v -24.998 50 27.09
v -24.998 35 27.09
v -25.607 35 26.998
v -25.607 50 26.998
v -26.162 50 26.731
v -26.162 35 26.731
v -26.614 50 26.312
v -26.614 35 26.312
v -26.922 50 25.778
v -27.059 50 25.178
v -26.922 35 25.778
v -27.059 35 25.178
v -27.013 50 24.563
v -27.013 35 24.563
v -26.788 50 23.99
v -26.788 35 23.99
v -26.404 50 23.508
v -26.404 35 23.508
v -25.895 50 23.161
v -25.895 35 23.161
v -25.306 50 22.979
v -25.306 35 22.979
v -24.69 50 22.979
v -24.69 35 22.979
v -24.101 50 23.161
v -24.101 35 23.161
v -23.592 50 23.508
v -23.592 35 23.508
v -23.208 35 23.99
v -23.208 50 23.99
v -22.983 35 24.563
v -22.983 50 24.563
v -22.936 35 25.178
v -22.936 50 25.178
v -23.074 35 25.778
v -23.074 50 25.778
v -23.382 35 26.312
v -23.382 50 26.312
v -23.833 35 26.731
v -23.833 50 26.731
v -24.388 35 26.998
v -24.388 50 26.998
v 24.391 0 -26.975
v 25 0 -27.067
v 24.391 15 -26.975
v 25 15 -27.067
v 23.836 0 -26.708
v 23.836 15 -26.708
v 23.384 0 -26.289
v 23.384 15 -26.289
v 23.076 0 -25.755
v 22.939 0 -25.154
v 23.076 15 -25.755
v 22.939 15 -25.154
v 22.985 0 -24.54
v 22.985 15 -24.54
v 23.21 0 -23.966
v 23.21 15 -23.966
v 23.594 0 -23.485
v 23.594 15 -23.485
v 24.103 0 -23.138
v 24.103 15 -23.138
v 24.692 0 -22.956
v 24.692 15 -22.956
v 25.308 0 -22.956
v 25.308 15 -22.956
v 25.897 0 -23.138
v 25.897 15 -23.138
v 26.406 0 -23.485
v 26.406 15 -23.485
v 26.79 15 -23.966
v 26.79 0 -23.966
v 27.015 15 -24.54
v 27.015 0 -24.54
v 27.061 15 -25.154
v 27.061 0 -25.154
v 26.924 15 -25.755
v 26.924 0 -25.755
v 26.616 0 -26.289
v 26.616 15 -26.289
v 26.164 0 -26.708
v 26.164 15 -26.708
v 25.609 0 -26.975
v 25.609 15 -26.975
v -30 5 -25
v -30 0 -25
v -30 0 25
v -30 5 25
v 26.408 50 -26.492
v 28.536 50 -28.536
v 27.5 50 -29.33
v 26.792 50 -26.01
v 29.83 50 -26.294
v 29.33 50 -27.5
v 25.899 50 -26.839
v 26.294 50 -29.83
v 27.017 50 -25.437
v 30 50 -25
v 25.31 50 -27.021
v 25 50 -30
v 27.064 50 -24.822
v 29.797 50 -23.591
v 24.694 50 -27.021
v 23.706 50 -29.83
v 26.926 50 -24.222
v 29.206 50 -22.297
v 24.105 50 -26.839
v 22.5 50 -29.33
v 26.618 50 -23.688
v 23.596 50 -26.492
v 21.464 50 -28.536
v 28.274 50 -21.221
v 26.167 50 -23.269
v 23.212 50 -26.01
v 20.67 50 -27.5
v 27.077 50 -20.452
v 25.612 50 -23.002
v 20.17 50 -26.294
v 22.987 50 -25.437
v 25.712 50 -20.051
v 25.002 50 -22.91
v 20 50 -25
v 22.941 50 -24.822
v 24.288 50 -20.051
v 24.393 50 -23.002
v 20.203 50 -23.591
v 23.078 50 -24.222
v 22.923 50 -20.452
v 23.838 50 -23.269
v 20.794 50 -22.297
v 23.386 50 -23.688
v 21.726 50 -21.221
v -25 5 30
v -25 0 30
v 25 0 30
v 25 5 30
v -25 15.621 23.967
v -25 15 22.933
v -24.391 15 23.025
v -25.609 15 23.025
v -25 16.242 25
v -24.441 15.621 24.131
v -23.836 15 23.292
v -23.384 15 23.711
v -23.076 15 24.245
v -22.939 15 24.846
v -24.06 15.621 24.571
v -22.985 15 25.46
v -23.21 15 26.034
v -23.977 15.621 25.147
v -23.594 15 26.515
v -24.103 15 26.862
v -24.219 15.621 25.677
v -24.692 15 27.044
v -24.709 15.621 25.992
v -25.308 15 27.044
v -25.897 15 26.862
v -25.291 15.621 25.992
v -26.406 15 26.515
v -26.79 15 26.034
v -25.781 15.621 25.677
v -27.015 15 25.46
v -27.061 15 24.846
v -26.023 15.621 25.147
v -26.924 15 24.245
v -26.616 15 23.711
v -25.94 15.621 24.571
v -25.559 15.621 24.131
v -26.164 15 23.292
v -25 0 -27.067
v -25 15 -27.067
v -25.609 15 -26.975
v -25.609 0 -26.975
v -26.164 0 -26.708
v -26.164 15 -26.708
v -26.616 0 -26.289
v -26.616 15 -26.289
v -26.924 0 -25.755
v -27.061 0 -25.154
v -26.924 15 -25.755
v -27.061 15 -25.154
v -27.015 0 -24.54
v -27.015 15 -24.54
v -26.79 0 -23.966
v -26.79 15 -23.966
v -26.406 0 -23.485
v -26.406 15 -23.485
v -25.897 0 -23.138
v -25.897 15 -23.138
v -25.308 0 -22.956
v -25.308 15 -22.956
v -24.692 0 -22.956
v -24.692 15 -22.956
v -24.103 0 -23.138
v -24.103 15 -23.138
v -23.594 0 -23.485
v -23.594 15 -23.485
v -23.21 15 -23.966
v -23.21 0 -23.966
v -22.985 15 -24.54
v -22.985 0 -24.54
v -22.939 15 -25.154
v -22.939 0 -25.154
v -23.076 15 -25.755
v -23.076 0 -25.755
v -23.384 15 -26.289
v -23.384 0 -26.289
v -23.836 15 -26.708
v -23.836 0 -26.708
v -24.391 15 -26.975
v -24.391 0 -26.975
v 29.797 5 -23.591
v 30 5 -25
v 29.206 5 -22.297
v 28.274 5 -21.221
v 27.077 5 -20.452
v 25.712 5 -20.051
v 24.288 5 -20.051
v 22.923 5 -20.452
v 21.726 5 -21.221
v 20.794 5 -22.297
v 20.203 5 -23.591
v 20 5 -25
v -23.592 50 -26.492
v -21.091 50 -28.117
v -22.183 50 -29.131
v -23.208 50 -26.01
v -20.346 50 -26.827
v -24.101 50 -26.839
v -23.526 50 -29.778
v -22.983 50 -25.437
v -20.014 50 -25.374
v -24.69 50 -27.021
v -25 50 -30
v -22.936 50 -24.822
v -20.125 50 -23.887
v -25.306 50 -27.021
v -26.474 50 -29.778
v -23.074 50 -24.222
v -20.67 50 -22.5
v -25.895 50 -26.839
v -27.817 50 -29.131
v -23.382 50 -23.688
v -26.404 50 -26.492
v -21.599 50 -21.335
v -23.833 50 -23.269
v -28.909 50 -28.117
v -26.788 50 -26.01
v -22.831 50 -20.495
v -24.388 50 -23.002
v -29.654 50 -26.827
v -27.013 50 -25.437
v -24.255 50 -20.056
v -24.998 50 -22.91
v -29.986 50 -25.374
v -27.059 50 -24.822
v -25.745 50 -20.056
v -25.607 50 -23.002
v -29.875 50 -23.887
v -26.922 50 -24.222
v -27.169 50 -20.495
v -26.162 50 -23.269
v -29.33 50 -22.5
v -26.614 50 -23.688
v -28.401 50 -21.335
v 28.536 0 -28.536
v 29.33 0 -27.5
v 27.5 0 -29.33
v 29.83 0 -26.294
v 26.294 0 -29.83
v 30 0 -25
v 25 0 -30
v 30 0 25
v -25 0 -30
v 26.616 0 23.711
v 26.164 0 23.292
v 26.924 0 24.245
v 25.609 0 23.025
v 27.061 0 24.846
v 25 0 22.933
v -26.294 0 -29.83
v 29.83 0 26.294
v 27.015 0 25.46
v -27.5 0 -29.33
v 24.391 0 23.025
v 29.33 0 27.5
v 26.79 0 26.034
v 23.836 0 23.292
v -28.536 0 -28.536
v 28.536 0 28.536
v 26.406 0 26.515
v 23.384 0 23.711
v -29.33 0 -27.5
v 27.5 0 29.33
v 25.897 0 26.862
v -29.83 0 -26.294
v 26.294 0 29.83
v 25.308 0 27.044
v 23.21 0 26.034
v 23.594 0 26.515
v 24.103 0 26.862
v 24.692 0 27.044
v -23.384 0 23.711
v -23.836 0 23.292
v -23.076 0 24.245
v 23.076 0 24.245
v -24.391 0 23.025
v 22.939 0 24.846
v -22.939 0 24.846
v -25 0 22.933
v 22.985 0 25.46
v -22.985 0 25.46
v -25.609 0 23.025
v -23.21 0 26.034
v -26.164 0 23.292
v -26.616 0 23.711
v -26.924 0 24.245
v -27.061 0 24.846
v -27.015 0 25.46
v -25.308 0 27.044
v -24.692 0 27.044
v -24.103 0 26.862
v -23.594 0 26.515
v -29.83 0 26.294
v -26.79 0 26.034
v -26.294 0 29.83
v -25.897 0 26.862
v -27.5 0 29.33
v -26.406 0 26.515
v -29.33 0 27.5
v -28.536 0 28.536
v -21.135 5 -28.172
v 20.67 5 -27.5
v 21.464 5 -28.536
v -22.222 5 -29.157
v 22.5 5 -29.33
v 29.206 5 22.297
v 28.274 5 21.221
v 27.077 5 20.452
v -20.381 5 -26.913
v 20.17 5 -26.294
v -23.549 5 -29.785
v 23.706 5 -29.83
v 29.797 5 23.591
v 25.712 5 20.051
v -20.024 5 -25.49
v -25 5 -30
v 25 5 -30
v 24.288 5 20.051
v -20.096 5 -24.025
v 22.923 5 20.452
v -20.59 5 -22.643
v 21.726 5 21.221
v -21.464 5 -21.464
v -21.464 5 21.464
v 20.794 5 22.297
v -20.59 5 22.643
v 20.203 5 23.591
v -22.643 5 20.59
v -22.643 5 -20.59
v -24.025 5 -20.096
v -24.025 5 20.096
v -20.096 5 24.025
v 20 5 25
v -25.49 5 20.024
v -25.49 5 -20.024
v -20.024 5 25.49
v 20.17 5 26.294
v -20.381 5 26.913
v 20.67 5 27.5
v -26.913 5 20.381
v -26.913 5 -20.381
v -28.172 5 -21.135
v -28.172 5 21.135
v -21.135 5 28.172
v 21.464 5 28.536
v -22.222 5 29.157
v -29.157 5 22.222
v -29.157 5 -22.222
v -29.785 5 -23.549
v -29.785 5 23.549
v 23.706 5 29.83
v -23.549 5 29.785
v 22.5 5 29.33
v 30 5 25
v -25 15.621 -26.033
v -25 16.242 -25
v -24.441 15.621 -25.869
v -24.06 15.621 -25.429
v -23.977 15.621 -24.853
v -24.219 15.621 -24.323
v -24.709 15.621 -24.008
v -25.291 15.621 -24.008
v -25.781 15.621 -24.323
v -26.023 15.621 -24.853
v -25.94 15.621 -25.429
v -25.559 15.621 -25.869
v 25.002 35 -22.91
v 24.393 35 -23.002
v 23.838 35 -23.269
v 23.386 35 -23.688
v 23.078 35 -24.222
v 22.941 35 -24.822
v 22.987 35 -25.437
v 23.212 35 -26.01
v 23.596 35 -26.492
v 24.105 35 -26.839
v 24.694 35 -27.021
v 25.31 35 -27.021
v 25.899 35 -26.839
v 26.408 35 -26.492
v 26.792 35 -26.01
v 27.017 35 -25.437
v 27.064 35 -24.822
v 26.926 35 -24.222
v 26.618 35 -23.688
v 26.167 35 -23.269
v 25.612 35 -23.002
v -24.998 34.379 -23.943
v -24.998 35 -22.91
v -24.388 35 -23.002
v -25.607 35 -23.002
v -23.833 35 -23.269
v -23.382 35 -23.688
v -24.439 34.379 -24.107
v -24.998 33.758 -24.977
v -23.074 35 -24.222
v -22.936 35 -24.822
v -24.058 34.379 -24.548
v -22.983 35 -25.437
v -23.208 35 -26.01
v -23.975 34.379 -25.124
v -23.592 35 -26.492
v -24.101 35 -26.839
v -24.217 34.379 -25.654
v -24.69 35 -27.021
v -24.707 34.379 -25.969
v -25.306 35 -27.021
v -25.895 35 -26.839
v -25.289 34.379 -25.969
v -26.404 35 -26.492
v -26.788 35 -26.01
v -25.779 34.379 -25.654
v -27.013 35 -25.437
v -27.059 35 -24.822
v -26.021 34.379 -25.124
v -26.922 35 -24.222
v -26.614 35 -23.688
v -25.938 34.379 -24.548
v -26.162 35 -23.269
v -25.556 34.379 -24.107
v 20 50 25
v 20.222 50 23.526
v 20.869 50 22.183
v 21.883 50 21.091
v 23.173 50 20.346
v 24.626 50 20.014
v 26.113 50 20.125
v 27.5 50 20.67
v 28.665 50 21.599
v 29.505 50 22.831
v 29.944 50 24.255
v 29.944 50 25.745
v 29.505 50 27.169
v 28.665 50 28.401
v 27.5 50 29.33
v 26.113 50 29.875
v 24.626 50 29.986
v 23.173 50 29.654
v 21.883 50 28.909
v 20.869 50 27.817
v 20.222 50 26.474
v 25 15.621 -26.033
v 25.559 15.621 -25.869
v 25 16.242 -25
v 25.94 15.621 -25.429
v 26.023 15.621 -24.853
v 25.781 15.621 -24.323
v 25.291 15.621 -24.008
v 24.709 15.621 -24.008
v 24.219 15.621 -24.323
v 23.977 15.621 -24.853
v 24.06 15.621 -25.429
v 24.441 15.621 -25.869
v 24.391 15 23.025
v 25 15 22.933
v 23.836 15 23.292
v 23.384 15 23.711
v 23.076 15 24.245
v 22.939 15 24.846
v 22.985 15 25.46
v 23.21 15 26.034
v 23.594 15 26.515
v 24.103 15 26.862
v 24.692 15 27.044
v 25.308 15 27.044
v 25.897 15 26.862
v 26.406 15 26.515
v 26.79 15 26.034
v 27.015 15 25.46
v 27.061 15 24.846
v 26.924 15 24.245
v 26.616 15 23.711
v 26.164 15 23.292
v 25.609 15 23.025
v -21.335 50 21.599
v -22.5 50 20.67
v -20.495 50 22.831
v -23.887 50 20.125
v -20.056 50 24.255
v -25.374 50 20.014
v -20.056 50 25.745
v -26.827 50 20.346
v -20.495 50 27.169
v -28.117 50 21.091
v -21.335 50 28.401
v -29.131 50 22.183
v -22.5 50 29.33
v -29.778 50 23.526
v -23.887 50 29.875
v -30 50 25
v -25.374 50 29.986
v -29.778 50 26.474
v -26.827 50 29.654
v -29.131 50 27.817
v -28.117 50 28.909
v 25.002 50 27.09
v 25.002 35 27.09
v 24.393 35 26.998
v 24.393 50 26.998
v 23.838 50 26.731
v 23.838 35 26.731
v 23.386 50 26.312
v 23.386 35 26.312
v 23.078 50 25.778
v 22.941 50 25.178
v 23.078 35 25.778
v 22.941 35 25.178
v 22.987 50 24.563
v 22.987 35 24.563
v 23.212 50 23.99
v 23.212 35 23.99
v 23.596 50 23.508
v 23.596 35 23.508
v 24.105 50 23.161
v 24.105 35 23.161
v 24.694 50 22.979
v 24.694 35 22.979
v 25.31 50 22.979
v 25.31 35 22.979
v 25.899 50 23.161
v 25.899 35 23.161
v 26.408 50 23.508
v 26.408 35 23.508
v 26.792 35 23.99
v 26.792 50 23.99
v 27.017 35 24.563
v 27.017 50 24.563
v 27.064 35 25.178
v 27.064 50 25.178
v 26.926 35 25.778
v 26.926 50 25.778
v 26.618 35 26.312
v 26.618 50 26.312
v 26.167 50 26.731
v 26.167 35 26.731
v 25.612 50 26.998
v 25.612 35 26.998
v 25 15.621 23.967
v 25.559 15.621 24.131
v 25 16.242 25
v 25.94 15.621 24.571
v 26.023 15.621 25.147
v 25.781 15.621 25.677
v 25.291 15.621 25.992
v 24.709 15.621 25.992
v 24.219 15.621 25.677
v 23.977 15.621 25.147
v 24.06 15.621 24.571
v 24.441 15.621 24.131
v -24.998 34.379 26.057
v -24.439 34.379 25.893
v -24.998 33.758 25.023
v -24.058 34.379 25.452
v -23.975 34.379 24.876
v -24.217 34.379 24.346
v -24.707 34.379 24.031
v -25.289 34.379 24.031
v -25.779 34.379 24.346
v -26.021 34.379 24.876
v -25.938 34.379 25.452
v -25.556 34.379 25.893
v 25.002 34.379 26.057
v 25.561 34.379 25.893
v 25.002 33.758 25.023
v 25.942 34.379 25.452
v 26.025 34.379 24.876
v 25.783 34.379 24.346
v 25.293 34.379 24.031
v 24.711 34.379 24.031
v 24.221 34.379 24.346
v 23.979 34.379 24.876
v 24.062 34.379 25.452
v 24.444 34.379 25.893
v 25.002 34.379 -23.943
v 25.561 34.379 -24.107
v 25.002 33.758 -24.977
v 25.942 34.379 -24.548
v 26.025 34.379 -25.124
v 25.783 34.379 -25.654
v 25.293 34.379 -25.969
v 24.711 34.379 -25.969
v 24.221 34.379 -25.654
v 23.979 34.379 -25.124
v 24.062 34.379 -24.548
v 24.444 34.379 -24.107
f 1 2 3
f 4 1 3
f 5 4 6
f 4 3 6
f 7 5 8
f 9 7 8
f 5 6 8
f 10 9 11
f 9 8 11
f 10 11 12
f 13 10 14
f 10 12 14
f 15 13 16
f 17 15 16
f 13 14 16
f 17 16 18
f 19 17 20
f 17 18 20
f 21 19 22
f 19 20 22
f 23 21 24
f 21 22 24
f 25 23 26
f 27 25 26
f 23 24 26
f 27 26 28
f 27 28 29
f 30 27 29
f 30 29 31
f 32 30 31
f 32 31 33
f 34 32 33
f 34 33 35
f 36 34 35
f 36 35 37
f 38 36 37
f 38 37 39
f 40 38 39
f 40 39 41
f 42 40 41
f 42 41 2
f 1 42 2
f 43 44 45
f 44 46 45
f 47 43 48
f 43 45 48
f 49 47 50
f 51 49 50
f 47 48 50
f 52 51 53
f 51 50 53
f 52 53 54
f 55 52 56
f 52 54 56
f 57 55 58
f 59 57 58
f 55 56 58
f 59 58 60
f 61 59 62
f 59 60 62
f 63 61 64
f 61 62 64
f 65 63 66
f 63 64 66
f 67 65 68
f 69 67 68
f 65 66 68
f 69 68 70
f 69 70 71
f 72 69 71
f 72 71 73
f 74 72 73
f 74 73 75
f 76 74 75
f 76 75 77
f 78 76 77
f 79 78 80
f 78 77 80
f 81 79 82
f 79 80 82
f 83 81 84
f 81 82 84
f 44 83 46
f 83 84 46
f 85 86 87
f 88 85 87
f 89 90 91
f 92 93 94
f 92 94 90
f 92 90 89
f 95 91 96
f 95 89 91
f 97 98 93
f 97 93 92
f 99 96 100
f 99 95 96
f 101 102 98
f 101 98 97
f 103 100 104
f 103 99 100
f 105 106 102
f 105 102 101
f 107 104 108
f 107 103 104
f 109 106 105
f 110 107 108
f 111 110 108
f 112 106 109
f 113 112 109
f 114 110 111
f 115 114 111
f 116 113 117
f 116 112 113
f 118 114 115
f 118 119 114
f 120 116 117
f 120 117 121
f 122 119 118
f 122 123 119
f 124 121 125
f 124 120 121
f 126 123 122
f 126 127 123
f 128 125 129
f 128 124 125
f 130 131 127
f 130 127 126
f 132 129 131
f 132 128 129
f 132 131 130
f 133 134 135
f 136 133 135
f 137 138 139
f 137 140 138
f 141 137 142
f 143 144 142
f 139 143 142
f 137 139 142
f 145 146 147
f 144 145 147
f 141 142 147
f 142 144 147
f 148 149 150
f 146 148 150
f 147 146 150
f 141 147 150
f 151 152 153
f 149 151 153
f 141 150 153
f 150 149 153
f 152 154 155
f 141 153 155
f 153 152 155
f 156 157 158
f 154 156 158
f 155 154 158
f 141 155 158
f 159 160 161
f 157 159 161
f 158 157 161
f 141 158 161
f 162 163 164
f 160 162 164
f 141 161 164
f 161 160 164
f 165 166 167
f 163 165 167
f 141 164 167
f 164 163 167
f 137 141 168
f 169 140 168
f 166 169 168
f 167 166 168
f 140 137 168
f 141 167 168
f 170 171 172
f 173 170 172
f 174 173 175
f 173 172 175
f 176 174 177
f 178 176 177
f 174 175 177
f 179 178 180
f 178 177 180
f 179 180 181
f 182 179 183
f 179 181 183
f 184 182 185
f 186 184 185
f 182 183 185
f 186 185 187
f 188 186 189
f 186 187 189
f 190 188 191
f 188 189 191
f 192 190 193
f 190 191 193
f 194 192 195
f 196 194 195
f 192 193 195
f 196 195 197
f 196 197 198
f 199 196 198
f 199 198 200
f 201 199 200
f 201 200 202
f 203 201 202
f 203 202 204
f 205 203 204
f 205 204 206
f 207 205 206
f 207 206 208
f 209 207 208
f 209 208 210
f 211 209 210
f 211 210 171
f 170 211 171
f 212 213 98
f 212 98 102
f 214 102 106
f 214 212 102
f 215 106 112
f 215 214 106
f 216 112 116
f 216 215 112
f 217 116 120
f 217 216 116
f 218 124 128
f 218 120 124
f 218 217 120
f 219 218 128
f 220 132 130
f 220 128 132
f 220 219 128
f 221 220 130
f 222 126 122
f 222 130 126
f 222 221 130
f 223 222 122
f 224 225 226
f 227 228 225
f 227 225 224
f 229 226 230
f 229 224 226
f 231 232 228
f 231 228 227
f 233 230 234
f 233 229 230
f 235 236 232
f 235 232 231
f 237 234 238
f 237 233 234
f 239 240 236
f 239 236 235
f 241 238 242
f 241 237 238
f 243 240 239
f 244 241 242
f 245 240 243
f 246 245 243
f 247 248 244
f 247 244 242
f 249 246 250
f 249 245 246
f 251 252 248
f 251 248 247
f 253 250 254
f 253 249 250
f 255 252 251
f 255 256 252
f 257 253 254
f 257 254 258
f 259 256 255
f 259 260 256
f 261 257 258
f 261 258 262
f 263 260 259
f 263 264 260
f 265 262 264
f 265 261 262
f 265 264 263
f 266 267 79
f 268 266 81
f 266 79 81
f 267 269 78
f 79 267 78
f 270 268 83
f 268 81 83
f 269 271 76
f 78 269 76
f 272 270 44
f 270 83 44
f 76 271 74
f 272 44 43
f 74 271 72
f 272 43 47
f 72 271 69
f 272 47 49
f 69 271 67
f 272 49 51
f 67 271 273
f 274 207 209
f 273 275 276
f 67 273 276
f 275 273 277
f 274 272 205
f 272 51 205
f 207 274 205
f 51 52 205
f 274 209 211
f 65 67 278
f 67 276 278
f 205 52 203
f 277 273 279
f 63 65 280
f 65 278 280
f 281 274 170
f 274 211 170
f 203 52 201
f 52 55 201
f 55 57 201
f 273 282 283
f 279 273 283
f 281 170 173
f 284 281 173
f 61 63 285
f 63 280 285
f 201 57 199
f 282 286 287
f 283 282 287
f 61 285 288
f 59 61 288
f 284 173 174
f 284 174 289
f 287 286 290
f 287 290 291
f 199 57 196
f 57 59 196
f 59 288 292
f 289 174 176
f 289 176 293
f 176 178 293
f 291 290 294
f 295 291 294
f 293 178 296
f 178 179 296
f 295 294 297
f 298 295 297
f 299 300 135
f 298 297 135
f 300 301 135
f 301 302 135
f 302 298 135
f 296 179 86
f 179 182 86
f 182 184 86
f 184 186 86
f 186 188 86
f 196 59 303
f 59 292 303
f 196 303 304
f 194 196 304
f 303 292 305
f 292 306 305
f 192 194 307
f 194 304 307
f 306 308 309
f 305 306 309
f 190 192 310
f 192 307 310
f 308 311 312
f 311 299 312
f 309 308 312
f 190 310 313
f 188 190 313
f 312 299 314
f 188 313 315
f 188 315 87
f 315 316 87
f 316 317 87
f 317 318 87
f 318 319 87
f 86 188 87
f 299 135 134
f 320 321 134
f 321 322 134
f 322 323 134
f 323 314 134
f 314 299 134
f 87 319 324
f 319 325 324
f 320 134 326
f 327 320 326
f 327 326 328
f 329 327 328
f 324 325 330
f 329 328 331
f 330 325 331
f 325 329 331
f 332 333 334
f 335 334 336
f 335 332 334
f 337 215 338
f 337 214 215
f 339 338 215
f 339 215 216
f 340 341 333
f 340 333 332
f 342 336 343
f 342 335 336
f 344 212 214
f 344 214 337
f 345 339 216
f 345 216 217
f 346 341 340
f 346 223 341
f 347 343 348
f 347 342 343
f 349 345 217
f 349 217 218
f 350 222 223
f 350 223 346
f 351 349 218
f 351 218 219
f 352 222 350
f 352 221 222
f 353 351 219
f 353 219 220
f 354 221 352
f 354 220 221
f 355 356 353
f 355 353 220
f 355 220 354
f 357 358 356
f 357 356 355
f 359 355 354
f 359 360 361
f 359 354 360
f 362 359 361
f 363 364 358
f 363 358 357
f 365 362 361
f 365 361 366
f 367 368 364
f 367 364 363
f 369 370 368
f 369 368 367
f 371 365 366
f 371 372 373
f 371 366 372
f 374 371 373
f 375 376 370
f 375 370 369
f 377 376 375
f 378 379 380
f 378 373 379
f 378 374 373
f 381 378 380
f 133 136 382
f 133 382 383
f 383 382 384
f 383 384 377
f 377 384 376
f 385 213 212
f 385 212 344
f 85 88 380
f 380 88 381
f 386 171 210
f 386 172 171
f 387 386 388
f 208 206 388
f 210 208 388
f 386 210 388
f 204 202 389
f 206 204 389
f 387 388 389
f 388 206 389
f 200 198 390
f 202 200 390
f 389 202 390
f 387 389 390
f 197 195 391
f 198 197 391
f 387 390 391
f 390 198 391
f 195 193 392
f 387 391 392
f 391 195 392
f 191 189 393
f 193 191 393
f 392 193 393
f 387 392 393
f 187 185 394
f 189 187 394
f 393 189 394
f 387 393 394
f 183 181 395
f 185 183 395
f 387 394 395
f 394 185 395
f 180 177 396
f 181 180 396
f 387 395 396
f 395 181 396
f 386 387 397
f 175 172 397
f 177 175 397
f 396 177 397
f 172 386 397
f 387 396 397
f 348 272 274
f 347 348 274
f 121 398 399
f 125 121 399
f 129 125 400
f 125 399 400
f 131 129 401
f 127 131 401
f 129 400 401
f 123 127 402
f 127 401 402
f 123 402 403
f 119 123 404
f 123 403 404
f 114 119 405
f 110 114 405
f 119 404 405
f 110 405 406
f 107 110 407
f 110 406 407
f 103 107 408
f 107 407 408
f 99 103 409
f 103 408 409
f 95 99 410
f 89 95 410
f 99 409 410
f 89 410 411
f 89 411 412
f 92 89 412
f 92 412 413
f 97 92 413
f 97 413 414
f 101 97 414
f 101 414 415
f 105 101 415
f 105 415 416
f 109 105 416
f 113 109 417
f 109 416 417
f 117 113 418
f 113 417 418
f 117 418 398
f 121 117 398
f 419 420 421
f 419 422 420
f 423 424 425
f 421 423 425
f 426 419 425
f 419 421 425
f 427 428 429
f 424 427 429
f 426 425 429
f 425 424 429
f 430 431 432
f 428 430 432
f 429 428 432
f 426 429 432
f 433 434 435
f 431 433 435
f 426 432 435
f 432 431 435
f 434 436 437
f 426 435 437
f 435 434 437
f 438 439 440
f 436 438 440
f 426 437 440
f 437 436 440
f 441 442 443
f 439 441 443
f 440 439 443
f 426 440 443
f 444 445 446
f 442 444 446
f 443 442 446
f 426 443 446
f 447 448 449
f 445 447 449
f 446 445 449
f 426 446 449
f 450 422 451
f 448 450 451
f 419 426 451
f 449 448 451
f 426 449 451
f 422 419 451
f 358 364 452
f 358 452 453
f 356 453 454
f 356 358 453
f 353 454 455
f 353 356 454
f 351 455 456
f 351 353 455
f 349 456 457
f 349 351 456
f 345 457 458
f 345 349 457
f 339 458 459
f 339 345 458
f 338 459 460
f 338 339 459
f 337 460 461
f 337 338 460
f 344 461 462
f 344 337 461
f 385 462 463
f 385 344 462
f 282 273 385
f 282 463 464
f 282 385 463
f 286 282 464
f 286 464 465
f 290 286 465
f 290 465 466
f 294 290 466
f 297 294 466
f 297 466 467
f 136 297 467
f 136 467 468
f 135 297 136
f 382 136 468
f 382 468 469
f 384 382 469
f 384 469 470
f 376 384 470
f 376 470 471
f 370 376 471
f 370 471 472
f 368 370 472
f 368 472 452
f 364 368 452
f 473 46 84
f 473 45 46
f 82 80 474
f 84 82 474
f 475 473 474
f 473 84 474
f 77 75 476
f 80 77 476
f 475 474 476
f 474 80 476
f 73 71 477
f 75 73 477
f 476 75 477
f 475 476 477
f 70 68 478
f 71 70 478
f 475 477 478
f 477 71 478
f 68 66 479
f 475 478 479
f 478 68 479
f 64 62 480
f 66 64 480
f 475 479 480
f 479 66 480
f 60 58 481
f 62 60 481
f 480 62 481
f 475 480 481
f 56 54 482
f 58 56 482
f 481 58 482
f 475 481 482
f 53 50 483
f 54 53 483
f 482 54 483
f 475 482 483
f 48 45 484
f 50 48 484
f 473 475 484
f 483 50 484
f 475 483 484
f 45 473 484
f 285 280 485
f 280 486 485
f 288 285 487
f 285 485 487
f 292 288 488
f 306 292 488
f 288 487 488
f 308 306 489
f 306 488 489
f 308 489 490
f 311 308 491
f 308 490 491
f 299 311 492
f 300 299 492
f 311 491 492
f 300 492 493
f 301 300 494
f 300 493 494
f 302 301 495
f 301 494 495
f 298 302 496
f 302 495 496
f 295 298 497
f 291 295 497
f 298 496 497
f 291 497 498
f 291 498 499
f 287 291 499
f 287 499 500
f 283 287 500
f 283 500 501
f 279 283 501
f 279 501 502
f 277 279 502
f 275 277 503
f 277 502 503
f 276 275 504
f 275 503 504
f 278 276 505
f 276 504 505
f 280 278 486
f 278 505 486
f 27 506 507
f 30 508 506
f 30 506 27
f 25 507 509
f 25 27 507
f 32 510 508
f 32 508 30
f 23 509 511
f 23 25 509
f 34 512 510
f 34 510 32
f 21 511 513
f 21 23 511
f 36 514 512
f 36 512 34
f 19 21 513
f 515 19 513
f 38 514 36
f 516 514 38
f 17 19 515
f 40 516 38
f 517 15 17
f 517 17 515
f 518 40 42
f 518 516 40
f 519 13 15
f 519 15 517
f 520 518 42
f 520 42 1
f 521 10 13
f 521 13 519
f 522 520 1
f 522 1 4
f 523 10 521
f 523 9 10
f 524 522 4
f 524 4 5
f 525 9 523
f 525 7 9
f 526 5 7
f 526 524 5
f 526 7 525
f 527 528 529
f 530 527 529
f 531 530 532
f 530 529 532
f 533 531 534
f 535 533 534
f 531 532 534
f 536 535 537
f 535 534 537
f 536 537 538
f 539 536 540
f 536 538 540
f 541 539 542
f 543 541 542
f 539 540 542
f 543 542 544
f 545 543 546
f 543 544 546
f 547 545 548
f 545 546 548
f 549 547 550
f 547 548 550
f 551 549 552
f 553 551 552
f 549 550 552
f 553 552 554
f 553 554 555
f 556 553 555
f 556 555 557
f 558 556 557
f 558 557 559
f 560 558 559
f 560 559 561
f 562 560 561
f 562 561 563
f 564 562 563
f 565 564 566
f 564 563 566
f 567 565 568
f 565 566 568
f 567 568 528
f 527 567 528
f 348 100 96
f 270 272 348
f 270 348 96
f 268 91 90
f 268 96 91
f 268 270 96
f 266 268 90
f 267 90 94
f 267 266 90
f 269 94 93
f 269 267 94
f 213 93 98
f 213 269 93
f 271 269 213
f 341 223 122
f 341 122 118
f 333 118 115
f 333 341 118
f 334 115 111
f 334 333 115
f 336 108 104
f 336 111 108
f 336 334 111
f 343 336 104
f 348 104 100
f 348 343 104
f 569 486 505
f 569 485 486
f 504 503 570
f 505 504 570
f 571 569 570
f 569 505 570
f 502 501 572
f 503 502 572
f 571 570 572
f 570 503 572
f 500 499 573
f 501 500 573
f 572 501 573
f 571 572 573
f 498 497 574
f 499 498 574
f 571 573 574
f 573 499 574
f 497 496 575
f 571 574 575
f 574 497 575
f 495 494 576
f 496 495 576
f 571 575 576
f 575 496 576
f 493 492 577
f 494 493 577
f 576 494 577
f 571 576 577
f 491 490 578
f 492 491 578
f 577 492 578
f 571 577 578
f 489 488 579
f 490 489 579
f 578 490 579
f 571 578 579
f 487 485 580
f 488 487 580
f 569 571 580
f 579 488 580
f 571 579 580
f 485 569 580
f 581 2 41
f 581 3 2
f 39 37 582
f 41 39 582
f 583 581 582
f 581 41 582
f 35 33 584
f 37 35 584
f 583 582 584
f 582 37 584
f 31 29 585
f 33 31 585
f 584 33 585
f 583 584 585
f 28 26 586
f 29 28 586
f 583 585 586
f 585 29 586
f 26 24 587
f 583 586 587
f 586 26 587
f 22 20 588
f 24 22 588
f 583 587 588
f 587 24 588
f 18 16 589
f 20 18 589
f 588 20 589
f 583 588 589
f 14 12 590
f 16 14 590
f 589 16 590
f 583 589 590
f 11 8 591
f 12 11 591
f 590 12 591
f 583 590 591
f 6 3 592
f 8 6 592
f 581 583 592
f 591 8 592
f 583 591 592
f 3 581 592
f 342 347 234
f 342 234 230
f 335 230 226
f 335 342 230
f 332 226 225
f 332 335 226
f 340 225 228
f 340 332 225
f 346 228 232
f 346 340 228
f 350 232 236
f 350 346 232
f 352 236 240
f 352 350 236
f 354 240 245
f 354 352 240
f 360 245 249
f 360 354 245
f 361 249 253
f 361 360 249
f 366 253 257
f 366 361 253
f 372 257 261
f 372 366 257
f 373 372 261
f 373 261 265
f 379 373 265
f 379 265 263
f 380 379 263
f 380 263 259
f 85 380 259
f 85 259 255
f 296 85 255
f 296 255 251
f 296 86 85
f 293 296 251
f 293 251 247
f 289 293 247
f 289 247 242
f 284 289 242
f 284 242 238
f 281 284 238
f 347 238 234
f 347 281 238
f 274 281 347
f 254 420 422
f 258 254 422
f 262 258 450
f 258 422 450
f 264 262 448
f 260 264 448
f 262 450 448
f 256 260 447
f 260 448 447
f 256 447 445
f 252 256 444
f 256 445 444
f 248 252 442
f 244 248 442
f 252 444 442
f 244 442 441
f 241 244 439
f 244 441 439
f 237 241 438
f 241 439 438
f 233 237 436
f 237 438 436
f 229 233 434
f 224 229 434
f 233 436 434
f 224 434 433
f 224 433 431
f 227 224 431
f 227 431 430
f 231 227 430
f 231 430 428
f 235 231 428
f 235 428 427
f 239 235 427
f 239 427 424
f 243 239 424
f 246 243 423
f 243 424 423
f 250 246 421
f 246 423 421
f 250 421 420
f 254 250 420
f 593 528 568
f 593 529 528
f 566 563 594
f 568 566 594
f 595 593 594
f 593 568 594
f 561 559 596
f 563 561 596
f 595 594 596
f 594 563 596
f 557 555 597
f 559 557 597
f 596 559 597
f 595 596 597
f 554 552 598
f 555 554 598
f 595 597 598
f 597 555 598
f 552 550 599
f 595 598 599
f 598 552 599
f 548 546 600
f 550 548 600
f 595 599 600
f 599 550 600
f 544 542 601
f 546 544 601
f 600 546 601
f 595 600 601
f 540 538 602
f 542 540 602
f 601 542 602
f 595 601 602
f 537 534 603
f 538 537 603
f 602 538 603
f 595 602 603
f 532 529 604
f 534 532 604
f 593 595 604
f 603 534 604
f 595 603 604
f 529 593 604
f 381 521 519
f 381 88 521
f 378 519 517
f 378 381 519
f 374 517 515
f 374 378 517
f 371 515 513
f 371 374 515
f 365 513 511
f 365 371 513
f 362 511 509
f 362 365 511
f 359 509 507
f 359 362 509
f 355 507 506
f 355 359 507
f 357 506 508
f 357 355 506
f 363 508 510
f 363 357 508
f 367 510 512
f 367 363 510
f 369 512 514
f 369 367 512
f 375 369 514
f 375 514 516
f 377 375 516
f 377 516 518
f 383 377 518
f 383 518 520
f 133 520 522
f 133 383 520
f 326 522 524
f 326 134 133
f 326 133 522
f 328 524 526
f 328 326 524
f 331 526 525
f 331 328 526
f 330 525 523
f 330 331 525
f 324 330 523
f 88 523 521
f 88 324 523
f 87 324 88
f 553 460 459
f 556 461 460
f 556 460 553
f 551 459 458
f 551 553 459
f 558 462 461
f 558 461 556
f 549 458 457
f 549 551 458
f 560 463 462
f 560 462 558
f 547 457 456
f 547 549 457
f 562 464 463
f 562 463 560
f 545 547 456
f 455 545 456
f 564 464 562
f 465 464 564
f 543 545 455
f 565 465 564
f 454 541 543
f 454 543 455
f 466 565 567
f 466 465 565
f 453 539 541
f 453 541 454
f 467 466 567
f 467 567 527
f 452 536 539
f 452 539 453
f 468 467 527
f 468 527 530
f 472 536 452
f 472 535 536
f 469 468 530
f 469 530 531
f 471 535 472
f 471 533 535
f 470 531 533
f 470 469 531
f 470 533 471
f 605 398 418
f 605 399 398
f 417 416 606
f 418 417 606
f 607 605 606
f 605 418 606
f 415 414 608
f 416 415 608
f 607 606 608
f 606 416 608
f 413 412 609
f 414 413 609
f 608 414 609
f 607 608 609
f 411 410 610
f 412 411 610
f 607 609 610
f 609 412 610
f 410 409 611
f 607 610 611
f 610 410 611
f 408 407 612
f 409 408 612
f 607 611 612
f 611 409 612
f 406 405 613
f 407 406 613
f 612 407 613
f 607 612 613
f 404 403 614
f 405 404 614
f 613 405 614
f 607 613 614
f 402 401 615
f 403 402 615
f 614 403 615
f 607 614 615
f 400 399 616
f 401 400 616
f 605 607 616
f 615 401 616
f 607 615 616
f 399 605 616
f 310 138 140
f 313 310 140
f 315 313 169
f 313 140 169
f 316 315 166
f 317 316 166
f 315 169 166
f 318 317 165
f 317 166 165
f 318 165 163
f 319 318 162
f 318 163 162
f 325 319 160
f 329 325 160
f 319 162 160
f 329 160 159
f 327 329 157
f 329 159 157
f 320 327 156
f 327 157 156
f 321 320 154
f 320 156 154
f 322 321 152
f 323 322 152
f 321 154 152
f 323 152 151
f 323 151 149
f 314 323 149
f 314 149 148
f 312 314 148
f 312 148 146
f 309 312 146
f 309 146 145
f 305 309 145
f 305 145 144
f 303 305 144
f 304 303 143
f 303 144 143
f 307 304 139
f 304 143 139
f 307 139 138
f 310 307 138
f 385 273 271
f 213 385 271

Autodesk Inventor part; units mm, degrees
ref_plane "YZ Plane" through (0, 0, 0) normal (1, 0, 0) x (0, 1, 0)
ref_plane "XZ Plane" through (0, 0, 0) normal (0, 1, 0) x (-1, 0, 0)
ref_plane "XY Plane" through (0, 0, 0) normal (0, 0, 1) x (1, 0, 0)
sketch "Эскиз1" plane through (0, 0, 0) normal (0, 1, 0) x (-1, 0, 0)
  line L0 (25, 30) -> (-25, 30)
  line L1 (-30, 25) -> (-30, -25)
  line L2 (-25, -30) -> (25, -30)
  line L3 (30, -25) -> (30, 25)
  line L4 (0, -43.4497) -> (0, 43.4497) projected
  line L5 (-43.4497, 0) -> (43.4497, 0) projected
  arc A0 (30, 25) -> (25, 30) centre (25, 25) ccw
  arc A1 (25, -30) -> (30, -25) centre (25, -25) ccw
  arc A2 (-30, -25) -> (-25, -30) centre (-25, -25) ccw
  arc A3 (-25, 30) -> (-30, 25) centre (-25, 25) ccw
  circle A4 centre (25, 25) radius 5
  circle A5 centre (25, -25) radius 5
  circle A6 centre (-25, 25) radius 5
  circle A7 centre (-25, -25) radius 5
  point P0 (0, 0)
  dimension "d0" = 5
  dimension "d1" = 25
  dimension "d2" = 25
extrude "Выдавливание1" add sketch "Эскиз1" along normal blind 5 contours A4 L3 L5 L4 L0 | L4 L5 L1 A6 L0 | L5 L3 A5 L2 L4 | L4 L2 A7 L1 L5
extrude "Выдавливание2" add sketch "Эскиз1" along normal blind 50 contours A0 A4 | A6 A3 | A1 A5 | A2 A7
hole "Отверстие1" at (25, 0, 25) at (-25, 0, 25) at (25, 0, -25) at (-25, 0, -25) direction (0, 1, 0) diameter 4.134 depth 15 tip angle 118 thread size "M5x0.8" class "6H" standard "ISO Metric profile"
sketch "Эскиз2" plane through (-25, 50, 25) normal (0, 1, 0) x (1, 0, 0)
  line L0 (-17, 25) -> (67, 25) projected
  line L1 (25, 67) -> (25, -17) projected
  point P0 (25, 25)
  point P1 (0.0023, -0.0231)
  point P2 (50.0023, -0.0231)
  point P3 (0.0023, 49.9769)
  point P4 (50.0023, 49.9769)
  dimension "d30" = 50
  dimension "d33" = 50
hole "Отверстие3" at (-24.9977, 50, 25.0231) at (-24.9977, 50, -24.9769) at (25.0023, 50, -24.9769) at (25.0023, 50, 25.0231) direction (0, -1, 0) diameter 4.134 depth 15 tip angle 118 thread size "M5x0.8" class "6H" standard "ISO Metric profile"
properties part number "стойка для лотка"
